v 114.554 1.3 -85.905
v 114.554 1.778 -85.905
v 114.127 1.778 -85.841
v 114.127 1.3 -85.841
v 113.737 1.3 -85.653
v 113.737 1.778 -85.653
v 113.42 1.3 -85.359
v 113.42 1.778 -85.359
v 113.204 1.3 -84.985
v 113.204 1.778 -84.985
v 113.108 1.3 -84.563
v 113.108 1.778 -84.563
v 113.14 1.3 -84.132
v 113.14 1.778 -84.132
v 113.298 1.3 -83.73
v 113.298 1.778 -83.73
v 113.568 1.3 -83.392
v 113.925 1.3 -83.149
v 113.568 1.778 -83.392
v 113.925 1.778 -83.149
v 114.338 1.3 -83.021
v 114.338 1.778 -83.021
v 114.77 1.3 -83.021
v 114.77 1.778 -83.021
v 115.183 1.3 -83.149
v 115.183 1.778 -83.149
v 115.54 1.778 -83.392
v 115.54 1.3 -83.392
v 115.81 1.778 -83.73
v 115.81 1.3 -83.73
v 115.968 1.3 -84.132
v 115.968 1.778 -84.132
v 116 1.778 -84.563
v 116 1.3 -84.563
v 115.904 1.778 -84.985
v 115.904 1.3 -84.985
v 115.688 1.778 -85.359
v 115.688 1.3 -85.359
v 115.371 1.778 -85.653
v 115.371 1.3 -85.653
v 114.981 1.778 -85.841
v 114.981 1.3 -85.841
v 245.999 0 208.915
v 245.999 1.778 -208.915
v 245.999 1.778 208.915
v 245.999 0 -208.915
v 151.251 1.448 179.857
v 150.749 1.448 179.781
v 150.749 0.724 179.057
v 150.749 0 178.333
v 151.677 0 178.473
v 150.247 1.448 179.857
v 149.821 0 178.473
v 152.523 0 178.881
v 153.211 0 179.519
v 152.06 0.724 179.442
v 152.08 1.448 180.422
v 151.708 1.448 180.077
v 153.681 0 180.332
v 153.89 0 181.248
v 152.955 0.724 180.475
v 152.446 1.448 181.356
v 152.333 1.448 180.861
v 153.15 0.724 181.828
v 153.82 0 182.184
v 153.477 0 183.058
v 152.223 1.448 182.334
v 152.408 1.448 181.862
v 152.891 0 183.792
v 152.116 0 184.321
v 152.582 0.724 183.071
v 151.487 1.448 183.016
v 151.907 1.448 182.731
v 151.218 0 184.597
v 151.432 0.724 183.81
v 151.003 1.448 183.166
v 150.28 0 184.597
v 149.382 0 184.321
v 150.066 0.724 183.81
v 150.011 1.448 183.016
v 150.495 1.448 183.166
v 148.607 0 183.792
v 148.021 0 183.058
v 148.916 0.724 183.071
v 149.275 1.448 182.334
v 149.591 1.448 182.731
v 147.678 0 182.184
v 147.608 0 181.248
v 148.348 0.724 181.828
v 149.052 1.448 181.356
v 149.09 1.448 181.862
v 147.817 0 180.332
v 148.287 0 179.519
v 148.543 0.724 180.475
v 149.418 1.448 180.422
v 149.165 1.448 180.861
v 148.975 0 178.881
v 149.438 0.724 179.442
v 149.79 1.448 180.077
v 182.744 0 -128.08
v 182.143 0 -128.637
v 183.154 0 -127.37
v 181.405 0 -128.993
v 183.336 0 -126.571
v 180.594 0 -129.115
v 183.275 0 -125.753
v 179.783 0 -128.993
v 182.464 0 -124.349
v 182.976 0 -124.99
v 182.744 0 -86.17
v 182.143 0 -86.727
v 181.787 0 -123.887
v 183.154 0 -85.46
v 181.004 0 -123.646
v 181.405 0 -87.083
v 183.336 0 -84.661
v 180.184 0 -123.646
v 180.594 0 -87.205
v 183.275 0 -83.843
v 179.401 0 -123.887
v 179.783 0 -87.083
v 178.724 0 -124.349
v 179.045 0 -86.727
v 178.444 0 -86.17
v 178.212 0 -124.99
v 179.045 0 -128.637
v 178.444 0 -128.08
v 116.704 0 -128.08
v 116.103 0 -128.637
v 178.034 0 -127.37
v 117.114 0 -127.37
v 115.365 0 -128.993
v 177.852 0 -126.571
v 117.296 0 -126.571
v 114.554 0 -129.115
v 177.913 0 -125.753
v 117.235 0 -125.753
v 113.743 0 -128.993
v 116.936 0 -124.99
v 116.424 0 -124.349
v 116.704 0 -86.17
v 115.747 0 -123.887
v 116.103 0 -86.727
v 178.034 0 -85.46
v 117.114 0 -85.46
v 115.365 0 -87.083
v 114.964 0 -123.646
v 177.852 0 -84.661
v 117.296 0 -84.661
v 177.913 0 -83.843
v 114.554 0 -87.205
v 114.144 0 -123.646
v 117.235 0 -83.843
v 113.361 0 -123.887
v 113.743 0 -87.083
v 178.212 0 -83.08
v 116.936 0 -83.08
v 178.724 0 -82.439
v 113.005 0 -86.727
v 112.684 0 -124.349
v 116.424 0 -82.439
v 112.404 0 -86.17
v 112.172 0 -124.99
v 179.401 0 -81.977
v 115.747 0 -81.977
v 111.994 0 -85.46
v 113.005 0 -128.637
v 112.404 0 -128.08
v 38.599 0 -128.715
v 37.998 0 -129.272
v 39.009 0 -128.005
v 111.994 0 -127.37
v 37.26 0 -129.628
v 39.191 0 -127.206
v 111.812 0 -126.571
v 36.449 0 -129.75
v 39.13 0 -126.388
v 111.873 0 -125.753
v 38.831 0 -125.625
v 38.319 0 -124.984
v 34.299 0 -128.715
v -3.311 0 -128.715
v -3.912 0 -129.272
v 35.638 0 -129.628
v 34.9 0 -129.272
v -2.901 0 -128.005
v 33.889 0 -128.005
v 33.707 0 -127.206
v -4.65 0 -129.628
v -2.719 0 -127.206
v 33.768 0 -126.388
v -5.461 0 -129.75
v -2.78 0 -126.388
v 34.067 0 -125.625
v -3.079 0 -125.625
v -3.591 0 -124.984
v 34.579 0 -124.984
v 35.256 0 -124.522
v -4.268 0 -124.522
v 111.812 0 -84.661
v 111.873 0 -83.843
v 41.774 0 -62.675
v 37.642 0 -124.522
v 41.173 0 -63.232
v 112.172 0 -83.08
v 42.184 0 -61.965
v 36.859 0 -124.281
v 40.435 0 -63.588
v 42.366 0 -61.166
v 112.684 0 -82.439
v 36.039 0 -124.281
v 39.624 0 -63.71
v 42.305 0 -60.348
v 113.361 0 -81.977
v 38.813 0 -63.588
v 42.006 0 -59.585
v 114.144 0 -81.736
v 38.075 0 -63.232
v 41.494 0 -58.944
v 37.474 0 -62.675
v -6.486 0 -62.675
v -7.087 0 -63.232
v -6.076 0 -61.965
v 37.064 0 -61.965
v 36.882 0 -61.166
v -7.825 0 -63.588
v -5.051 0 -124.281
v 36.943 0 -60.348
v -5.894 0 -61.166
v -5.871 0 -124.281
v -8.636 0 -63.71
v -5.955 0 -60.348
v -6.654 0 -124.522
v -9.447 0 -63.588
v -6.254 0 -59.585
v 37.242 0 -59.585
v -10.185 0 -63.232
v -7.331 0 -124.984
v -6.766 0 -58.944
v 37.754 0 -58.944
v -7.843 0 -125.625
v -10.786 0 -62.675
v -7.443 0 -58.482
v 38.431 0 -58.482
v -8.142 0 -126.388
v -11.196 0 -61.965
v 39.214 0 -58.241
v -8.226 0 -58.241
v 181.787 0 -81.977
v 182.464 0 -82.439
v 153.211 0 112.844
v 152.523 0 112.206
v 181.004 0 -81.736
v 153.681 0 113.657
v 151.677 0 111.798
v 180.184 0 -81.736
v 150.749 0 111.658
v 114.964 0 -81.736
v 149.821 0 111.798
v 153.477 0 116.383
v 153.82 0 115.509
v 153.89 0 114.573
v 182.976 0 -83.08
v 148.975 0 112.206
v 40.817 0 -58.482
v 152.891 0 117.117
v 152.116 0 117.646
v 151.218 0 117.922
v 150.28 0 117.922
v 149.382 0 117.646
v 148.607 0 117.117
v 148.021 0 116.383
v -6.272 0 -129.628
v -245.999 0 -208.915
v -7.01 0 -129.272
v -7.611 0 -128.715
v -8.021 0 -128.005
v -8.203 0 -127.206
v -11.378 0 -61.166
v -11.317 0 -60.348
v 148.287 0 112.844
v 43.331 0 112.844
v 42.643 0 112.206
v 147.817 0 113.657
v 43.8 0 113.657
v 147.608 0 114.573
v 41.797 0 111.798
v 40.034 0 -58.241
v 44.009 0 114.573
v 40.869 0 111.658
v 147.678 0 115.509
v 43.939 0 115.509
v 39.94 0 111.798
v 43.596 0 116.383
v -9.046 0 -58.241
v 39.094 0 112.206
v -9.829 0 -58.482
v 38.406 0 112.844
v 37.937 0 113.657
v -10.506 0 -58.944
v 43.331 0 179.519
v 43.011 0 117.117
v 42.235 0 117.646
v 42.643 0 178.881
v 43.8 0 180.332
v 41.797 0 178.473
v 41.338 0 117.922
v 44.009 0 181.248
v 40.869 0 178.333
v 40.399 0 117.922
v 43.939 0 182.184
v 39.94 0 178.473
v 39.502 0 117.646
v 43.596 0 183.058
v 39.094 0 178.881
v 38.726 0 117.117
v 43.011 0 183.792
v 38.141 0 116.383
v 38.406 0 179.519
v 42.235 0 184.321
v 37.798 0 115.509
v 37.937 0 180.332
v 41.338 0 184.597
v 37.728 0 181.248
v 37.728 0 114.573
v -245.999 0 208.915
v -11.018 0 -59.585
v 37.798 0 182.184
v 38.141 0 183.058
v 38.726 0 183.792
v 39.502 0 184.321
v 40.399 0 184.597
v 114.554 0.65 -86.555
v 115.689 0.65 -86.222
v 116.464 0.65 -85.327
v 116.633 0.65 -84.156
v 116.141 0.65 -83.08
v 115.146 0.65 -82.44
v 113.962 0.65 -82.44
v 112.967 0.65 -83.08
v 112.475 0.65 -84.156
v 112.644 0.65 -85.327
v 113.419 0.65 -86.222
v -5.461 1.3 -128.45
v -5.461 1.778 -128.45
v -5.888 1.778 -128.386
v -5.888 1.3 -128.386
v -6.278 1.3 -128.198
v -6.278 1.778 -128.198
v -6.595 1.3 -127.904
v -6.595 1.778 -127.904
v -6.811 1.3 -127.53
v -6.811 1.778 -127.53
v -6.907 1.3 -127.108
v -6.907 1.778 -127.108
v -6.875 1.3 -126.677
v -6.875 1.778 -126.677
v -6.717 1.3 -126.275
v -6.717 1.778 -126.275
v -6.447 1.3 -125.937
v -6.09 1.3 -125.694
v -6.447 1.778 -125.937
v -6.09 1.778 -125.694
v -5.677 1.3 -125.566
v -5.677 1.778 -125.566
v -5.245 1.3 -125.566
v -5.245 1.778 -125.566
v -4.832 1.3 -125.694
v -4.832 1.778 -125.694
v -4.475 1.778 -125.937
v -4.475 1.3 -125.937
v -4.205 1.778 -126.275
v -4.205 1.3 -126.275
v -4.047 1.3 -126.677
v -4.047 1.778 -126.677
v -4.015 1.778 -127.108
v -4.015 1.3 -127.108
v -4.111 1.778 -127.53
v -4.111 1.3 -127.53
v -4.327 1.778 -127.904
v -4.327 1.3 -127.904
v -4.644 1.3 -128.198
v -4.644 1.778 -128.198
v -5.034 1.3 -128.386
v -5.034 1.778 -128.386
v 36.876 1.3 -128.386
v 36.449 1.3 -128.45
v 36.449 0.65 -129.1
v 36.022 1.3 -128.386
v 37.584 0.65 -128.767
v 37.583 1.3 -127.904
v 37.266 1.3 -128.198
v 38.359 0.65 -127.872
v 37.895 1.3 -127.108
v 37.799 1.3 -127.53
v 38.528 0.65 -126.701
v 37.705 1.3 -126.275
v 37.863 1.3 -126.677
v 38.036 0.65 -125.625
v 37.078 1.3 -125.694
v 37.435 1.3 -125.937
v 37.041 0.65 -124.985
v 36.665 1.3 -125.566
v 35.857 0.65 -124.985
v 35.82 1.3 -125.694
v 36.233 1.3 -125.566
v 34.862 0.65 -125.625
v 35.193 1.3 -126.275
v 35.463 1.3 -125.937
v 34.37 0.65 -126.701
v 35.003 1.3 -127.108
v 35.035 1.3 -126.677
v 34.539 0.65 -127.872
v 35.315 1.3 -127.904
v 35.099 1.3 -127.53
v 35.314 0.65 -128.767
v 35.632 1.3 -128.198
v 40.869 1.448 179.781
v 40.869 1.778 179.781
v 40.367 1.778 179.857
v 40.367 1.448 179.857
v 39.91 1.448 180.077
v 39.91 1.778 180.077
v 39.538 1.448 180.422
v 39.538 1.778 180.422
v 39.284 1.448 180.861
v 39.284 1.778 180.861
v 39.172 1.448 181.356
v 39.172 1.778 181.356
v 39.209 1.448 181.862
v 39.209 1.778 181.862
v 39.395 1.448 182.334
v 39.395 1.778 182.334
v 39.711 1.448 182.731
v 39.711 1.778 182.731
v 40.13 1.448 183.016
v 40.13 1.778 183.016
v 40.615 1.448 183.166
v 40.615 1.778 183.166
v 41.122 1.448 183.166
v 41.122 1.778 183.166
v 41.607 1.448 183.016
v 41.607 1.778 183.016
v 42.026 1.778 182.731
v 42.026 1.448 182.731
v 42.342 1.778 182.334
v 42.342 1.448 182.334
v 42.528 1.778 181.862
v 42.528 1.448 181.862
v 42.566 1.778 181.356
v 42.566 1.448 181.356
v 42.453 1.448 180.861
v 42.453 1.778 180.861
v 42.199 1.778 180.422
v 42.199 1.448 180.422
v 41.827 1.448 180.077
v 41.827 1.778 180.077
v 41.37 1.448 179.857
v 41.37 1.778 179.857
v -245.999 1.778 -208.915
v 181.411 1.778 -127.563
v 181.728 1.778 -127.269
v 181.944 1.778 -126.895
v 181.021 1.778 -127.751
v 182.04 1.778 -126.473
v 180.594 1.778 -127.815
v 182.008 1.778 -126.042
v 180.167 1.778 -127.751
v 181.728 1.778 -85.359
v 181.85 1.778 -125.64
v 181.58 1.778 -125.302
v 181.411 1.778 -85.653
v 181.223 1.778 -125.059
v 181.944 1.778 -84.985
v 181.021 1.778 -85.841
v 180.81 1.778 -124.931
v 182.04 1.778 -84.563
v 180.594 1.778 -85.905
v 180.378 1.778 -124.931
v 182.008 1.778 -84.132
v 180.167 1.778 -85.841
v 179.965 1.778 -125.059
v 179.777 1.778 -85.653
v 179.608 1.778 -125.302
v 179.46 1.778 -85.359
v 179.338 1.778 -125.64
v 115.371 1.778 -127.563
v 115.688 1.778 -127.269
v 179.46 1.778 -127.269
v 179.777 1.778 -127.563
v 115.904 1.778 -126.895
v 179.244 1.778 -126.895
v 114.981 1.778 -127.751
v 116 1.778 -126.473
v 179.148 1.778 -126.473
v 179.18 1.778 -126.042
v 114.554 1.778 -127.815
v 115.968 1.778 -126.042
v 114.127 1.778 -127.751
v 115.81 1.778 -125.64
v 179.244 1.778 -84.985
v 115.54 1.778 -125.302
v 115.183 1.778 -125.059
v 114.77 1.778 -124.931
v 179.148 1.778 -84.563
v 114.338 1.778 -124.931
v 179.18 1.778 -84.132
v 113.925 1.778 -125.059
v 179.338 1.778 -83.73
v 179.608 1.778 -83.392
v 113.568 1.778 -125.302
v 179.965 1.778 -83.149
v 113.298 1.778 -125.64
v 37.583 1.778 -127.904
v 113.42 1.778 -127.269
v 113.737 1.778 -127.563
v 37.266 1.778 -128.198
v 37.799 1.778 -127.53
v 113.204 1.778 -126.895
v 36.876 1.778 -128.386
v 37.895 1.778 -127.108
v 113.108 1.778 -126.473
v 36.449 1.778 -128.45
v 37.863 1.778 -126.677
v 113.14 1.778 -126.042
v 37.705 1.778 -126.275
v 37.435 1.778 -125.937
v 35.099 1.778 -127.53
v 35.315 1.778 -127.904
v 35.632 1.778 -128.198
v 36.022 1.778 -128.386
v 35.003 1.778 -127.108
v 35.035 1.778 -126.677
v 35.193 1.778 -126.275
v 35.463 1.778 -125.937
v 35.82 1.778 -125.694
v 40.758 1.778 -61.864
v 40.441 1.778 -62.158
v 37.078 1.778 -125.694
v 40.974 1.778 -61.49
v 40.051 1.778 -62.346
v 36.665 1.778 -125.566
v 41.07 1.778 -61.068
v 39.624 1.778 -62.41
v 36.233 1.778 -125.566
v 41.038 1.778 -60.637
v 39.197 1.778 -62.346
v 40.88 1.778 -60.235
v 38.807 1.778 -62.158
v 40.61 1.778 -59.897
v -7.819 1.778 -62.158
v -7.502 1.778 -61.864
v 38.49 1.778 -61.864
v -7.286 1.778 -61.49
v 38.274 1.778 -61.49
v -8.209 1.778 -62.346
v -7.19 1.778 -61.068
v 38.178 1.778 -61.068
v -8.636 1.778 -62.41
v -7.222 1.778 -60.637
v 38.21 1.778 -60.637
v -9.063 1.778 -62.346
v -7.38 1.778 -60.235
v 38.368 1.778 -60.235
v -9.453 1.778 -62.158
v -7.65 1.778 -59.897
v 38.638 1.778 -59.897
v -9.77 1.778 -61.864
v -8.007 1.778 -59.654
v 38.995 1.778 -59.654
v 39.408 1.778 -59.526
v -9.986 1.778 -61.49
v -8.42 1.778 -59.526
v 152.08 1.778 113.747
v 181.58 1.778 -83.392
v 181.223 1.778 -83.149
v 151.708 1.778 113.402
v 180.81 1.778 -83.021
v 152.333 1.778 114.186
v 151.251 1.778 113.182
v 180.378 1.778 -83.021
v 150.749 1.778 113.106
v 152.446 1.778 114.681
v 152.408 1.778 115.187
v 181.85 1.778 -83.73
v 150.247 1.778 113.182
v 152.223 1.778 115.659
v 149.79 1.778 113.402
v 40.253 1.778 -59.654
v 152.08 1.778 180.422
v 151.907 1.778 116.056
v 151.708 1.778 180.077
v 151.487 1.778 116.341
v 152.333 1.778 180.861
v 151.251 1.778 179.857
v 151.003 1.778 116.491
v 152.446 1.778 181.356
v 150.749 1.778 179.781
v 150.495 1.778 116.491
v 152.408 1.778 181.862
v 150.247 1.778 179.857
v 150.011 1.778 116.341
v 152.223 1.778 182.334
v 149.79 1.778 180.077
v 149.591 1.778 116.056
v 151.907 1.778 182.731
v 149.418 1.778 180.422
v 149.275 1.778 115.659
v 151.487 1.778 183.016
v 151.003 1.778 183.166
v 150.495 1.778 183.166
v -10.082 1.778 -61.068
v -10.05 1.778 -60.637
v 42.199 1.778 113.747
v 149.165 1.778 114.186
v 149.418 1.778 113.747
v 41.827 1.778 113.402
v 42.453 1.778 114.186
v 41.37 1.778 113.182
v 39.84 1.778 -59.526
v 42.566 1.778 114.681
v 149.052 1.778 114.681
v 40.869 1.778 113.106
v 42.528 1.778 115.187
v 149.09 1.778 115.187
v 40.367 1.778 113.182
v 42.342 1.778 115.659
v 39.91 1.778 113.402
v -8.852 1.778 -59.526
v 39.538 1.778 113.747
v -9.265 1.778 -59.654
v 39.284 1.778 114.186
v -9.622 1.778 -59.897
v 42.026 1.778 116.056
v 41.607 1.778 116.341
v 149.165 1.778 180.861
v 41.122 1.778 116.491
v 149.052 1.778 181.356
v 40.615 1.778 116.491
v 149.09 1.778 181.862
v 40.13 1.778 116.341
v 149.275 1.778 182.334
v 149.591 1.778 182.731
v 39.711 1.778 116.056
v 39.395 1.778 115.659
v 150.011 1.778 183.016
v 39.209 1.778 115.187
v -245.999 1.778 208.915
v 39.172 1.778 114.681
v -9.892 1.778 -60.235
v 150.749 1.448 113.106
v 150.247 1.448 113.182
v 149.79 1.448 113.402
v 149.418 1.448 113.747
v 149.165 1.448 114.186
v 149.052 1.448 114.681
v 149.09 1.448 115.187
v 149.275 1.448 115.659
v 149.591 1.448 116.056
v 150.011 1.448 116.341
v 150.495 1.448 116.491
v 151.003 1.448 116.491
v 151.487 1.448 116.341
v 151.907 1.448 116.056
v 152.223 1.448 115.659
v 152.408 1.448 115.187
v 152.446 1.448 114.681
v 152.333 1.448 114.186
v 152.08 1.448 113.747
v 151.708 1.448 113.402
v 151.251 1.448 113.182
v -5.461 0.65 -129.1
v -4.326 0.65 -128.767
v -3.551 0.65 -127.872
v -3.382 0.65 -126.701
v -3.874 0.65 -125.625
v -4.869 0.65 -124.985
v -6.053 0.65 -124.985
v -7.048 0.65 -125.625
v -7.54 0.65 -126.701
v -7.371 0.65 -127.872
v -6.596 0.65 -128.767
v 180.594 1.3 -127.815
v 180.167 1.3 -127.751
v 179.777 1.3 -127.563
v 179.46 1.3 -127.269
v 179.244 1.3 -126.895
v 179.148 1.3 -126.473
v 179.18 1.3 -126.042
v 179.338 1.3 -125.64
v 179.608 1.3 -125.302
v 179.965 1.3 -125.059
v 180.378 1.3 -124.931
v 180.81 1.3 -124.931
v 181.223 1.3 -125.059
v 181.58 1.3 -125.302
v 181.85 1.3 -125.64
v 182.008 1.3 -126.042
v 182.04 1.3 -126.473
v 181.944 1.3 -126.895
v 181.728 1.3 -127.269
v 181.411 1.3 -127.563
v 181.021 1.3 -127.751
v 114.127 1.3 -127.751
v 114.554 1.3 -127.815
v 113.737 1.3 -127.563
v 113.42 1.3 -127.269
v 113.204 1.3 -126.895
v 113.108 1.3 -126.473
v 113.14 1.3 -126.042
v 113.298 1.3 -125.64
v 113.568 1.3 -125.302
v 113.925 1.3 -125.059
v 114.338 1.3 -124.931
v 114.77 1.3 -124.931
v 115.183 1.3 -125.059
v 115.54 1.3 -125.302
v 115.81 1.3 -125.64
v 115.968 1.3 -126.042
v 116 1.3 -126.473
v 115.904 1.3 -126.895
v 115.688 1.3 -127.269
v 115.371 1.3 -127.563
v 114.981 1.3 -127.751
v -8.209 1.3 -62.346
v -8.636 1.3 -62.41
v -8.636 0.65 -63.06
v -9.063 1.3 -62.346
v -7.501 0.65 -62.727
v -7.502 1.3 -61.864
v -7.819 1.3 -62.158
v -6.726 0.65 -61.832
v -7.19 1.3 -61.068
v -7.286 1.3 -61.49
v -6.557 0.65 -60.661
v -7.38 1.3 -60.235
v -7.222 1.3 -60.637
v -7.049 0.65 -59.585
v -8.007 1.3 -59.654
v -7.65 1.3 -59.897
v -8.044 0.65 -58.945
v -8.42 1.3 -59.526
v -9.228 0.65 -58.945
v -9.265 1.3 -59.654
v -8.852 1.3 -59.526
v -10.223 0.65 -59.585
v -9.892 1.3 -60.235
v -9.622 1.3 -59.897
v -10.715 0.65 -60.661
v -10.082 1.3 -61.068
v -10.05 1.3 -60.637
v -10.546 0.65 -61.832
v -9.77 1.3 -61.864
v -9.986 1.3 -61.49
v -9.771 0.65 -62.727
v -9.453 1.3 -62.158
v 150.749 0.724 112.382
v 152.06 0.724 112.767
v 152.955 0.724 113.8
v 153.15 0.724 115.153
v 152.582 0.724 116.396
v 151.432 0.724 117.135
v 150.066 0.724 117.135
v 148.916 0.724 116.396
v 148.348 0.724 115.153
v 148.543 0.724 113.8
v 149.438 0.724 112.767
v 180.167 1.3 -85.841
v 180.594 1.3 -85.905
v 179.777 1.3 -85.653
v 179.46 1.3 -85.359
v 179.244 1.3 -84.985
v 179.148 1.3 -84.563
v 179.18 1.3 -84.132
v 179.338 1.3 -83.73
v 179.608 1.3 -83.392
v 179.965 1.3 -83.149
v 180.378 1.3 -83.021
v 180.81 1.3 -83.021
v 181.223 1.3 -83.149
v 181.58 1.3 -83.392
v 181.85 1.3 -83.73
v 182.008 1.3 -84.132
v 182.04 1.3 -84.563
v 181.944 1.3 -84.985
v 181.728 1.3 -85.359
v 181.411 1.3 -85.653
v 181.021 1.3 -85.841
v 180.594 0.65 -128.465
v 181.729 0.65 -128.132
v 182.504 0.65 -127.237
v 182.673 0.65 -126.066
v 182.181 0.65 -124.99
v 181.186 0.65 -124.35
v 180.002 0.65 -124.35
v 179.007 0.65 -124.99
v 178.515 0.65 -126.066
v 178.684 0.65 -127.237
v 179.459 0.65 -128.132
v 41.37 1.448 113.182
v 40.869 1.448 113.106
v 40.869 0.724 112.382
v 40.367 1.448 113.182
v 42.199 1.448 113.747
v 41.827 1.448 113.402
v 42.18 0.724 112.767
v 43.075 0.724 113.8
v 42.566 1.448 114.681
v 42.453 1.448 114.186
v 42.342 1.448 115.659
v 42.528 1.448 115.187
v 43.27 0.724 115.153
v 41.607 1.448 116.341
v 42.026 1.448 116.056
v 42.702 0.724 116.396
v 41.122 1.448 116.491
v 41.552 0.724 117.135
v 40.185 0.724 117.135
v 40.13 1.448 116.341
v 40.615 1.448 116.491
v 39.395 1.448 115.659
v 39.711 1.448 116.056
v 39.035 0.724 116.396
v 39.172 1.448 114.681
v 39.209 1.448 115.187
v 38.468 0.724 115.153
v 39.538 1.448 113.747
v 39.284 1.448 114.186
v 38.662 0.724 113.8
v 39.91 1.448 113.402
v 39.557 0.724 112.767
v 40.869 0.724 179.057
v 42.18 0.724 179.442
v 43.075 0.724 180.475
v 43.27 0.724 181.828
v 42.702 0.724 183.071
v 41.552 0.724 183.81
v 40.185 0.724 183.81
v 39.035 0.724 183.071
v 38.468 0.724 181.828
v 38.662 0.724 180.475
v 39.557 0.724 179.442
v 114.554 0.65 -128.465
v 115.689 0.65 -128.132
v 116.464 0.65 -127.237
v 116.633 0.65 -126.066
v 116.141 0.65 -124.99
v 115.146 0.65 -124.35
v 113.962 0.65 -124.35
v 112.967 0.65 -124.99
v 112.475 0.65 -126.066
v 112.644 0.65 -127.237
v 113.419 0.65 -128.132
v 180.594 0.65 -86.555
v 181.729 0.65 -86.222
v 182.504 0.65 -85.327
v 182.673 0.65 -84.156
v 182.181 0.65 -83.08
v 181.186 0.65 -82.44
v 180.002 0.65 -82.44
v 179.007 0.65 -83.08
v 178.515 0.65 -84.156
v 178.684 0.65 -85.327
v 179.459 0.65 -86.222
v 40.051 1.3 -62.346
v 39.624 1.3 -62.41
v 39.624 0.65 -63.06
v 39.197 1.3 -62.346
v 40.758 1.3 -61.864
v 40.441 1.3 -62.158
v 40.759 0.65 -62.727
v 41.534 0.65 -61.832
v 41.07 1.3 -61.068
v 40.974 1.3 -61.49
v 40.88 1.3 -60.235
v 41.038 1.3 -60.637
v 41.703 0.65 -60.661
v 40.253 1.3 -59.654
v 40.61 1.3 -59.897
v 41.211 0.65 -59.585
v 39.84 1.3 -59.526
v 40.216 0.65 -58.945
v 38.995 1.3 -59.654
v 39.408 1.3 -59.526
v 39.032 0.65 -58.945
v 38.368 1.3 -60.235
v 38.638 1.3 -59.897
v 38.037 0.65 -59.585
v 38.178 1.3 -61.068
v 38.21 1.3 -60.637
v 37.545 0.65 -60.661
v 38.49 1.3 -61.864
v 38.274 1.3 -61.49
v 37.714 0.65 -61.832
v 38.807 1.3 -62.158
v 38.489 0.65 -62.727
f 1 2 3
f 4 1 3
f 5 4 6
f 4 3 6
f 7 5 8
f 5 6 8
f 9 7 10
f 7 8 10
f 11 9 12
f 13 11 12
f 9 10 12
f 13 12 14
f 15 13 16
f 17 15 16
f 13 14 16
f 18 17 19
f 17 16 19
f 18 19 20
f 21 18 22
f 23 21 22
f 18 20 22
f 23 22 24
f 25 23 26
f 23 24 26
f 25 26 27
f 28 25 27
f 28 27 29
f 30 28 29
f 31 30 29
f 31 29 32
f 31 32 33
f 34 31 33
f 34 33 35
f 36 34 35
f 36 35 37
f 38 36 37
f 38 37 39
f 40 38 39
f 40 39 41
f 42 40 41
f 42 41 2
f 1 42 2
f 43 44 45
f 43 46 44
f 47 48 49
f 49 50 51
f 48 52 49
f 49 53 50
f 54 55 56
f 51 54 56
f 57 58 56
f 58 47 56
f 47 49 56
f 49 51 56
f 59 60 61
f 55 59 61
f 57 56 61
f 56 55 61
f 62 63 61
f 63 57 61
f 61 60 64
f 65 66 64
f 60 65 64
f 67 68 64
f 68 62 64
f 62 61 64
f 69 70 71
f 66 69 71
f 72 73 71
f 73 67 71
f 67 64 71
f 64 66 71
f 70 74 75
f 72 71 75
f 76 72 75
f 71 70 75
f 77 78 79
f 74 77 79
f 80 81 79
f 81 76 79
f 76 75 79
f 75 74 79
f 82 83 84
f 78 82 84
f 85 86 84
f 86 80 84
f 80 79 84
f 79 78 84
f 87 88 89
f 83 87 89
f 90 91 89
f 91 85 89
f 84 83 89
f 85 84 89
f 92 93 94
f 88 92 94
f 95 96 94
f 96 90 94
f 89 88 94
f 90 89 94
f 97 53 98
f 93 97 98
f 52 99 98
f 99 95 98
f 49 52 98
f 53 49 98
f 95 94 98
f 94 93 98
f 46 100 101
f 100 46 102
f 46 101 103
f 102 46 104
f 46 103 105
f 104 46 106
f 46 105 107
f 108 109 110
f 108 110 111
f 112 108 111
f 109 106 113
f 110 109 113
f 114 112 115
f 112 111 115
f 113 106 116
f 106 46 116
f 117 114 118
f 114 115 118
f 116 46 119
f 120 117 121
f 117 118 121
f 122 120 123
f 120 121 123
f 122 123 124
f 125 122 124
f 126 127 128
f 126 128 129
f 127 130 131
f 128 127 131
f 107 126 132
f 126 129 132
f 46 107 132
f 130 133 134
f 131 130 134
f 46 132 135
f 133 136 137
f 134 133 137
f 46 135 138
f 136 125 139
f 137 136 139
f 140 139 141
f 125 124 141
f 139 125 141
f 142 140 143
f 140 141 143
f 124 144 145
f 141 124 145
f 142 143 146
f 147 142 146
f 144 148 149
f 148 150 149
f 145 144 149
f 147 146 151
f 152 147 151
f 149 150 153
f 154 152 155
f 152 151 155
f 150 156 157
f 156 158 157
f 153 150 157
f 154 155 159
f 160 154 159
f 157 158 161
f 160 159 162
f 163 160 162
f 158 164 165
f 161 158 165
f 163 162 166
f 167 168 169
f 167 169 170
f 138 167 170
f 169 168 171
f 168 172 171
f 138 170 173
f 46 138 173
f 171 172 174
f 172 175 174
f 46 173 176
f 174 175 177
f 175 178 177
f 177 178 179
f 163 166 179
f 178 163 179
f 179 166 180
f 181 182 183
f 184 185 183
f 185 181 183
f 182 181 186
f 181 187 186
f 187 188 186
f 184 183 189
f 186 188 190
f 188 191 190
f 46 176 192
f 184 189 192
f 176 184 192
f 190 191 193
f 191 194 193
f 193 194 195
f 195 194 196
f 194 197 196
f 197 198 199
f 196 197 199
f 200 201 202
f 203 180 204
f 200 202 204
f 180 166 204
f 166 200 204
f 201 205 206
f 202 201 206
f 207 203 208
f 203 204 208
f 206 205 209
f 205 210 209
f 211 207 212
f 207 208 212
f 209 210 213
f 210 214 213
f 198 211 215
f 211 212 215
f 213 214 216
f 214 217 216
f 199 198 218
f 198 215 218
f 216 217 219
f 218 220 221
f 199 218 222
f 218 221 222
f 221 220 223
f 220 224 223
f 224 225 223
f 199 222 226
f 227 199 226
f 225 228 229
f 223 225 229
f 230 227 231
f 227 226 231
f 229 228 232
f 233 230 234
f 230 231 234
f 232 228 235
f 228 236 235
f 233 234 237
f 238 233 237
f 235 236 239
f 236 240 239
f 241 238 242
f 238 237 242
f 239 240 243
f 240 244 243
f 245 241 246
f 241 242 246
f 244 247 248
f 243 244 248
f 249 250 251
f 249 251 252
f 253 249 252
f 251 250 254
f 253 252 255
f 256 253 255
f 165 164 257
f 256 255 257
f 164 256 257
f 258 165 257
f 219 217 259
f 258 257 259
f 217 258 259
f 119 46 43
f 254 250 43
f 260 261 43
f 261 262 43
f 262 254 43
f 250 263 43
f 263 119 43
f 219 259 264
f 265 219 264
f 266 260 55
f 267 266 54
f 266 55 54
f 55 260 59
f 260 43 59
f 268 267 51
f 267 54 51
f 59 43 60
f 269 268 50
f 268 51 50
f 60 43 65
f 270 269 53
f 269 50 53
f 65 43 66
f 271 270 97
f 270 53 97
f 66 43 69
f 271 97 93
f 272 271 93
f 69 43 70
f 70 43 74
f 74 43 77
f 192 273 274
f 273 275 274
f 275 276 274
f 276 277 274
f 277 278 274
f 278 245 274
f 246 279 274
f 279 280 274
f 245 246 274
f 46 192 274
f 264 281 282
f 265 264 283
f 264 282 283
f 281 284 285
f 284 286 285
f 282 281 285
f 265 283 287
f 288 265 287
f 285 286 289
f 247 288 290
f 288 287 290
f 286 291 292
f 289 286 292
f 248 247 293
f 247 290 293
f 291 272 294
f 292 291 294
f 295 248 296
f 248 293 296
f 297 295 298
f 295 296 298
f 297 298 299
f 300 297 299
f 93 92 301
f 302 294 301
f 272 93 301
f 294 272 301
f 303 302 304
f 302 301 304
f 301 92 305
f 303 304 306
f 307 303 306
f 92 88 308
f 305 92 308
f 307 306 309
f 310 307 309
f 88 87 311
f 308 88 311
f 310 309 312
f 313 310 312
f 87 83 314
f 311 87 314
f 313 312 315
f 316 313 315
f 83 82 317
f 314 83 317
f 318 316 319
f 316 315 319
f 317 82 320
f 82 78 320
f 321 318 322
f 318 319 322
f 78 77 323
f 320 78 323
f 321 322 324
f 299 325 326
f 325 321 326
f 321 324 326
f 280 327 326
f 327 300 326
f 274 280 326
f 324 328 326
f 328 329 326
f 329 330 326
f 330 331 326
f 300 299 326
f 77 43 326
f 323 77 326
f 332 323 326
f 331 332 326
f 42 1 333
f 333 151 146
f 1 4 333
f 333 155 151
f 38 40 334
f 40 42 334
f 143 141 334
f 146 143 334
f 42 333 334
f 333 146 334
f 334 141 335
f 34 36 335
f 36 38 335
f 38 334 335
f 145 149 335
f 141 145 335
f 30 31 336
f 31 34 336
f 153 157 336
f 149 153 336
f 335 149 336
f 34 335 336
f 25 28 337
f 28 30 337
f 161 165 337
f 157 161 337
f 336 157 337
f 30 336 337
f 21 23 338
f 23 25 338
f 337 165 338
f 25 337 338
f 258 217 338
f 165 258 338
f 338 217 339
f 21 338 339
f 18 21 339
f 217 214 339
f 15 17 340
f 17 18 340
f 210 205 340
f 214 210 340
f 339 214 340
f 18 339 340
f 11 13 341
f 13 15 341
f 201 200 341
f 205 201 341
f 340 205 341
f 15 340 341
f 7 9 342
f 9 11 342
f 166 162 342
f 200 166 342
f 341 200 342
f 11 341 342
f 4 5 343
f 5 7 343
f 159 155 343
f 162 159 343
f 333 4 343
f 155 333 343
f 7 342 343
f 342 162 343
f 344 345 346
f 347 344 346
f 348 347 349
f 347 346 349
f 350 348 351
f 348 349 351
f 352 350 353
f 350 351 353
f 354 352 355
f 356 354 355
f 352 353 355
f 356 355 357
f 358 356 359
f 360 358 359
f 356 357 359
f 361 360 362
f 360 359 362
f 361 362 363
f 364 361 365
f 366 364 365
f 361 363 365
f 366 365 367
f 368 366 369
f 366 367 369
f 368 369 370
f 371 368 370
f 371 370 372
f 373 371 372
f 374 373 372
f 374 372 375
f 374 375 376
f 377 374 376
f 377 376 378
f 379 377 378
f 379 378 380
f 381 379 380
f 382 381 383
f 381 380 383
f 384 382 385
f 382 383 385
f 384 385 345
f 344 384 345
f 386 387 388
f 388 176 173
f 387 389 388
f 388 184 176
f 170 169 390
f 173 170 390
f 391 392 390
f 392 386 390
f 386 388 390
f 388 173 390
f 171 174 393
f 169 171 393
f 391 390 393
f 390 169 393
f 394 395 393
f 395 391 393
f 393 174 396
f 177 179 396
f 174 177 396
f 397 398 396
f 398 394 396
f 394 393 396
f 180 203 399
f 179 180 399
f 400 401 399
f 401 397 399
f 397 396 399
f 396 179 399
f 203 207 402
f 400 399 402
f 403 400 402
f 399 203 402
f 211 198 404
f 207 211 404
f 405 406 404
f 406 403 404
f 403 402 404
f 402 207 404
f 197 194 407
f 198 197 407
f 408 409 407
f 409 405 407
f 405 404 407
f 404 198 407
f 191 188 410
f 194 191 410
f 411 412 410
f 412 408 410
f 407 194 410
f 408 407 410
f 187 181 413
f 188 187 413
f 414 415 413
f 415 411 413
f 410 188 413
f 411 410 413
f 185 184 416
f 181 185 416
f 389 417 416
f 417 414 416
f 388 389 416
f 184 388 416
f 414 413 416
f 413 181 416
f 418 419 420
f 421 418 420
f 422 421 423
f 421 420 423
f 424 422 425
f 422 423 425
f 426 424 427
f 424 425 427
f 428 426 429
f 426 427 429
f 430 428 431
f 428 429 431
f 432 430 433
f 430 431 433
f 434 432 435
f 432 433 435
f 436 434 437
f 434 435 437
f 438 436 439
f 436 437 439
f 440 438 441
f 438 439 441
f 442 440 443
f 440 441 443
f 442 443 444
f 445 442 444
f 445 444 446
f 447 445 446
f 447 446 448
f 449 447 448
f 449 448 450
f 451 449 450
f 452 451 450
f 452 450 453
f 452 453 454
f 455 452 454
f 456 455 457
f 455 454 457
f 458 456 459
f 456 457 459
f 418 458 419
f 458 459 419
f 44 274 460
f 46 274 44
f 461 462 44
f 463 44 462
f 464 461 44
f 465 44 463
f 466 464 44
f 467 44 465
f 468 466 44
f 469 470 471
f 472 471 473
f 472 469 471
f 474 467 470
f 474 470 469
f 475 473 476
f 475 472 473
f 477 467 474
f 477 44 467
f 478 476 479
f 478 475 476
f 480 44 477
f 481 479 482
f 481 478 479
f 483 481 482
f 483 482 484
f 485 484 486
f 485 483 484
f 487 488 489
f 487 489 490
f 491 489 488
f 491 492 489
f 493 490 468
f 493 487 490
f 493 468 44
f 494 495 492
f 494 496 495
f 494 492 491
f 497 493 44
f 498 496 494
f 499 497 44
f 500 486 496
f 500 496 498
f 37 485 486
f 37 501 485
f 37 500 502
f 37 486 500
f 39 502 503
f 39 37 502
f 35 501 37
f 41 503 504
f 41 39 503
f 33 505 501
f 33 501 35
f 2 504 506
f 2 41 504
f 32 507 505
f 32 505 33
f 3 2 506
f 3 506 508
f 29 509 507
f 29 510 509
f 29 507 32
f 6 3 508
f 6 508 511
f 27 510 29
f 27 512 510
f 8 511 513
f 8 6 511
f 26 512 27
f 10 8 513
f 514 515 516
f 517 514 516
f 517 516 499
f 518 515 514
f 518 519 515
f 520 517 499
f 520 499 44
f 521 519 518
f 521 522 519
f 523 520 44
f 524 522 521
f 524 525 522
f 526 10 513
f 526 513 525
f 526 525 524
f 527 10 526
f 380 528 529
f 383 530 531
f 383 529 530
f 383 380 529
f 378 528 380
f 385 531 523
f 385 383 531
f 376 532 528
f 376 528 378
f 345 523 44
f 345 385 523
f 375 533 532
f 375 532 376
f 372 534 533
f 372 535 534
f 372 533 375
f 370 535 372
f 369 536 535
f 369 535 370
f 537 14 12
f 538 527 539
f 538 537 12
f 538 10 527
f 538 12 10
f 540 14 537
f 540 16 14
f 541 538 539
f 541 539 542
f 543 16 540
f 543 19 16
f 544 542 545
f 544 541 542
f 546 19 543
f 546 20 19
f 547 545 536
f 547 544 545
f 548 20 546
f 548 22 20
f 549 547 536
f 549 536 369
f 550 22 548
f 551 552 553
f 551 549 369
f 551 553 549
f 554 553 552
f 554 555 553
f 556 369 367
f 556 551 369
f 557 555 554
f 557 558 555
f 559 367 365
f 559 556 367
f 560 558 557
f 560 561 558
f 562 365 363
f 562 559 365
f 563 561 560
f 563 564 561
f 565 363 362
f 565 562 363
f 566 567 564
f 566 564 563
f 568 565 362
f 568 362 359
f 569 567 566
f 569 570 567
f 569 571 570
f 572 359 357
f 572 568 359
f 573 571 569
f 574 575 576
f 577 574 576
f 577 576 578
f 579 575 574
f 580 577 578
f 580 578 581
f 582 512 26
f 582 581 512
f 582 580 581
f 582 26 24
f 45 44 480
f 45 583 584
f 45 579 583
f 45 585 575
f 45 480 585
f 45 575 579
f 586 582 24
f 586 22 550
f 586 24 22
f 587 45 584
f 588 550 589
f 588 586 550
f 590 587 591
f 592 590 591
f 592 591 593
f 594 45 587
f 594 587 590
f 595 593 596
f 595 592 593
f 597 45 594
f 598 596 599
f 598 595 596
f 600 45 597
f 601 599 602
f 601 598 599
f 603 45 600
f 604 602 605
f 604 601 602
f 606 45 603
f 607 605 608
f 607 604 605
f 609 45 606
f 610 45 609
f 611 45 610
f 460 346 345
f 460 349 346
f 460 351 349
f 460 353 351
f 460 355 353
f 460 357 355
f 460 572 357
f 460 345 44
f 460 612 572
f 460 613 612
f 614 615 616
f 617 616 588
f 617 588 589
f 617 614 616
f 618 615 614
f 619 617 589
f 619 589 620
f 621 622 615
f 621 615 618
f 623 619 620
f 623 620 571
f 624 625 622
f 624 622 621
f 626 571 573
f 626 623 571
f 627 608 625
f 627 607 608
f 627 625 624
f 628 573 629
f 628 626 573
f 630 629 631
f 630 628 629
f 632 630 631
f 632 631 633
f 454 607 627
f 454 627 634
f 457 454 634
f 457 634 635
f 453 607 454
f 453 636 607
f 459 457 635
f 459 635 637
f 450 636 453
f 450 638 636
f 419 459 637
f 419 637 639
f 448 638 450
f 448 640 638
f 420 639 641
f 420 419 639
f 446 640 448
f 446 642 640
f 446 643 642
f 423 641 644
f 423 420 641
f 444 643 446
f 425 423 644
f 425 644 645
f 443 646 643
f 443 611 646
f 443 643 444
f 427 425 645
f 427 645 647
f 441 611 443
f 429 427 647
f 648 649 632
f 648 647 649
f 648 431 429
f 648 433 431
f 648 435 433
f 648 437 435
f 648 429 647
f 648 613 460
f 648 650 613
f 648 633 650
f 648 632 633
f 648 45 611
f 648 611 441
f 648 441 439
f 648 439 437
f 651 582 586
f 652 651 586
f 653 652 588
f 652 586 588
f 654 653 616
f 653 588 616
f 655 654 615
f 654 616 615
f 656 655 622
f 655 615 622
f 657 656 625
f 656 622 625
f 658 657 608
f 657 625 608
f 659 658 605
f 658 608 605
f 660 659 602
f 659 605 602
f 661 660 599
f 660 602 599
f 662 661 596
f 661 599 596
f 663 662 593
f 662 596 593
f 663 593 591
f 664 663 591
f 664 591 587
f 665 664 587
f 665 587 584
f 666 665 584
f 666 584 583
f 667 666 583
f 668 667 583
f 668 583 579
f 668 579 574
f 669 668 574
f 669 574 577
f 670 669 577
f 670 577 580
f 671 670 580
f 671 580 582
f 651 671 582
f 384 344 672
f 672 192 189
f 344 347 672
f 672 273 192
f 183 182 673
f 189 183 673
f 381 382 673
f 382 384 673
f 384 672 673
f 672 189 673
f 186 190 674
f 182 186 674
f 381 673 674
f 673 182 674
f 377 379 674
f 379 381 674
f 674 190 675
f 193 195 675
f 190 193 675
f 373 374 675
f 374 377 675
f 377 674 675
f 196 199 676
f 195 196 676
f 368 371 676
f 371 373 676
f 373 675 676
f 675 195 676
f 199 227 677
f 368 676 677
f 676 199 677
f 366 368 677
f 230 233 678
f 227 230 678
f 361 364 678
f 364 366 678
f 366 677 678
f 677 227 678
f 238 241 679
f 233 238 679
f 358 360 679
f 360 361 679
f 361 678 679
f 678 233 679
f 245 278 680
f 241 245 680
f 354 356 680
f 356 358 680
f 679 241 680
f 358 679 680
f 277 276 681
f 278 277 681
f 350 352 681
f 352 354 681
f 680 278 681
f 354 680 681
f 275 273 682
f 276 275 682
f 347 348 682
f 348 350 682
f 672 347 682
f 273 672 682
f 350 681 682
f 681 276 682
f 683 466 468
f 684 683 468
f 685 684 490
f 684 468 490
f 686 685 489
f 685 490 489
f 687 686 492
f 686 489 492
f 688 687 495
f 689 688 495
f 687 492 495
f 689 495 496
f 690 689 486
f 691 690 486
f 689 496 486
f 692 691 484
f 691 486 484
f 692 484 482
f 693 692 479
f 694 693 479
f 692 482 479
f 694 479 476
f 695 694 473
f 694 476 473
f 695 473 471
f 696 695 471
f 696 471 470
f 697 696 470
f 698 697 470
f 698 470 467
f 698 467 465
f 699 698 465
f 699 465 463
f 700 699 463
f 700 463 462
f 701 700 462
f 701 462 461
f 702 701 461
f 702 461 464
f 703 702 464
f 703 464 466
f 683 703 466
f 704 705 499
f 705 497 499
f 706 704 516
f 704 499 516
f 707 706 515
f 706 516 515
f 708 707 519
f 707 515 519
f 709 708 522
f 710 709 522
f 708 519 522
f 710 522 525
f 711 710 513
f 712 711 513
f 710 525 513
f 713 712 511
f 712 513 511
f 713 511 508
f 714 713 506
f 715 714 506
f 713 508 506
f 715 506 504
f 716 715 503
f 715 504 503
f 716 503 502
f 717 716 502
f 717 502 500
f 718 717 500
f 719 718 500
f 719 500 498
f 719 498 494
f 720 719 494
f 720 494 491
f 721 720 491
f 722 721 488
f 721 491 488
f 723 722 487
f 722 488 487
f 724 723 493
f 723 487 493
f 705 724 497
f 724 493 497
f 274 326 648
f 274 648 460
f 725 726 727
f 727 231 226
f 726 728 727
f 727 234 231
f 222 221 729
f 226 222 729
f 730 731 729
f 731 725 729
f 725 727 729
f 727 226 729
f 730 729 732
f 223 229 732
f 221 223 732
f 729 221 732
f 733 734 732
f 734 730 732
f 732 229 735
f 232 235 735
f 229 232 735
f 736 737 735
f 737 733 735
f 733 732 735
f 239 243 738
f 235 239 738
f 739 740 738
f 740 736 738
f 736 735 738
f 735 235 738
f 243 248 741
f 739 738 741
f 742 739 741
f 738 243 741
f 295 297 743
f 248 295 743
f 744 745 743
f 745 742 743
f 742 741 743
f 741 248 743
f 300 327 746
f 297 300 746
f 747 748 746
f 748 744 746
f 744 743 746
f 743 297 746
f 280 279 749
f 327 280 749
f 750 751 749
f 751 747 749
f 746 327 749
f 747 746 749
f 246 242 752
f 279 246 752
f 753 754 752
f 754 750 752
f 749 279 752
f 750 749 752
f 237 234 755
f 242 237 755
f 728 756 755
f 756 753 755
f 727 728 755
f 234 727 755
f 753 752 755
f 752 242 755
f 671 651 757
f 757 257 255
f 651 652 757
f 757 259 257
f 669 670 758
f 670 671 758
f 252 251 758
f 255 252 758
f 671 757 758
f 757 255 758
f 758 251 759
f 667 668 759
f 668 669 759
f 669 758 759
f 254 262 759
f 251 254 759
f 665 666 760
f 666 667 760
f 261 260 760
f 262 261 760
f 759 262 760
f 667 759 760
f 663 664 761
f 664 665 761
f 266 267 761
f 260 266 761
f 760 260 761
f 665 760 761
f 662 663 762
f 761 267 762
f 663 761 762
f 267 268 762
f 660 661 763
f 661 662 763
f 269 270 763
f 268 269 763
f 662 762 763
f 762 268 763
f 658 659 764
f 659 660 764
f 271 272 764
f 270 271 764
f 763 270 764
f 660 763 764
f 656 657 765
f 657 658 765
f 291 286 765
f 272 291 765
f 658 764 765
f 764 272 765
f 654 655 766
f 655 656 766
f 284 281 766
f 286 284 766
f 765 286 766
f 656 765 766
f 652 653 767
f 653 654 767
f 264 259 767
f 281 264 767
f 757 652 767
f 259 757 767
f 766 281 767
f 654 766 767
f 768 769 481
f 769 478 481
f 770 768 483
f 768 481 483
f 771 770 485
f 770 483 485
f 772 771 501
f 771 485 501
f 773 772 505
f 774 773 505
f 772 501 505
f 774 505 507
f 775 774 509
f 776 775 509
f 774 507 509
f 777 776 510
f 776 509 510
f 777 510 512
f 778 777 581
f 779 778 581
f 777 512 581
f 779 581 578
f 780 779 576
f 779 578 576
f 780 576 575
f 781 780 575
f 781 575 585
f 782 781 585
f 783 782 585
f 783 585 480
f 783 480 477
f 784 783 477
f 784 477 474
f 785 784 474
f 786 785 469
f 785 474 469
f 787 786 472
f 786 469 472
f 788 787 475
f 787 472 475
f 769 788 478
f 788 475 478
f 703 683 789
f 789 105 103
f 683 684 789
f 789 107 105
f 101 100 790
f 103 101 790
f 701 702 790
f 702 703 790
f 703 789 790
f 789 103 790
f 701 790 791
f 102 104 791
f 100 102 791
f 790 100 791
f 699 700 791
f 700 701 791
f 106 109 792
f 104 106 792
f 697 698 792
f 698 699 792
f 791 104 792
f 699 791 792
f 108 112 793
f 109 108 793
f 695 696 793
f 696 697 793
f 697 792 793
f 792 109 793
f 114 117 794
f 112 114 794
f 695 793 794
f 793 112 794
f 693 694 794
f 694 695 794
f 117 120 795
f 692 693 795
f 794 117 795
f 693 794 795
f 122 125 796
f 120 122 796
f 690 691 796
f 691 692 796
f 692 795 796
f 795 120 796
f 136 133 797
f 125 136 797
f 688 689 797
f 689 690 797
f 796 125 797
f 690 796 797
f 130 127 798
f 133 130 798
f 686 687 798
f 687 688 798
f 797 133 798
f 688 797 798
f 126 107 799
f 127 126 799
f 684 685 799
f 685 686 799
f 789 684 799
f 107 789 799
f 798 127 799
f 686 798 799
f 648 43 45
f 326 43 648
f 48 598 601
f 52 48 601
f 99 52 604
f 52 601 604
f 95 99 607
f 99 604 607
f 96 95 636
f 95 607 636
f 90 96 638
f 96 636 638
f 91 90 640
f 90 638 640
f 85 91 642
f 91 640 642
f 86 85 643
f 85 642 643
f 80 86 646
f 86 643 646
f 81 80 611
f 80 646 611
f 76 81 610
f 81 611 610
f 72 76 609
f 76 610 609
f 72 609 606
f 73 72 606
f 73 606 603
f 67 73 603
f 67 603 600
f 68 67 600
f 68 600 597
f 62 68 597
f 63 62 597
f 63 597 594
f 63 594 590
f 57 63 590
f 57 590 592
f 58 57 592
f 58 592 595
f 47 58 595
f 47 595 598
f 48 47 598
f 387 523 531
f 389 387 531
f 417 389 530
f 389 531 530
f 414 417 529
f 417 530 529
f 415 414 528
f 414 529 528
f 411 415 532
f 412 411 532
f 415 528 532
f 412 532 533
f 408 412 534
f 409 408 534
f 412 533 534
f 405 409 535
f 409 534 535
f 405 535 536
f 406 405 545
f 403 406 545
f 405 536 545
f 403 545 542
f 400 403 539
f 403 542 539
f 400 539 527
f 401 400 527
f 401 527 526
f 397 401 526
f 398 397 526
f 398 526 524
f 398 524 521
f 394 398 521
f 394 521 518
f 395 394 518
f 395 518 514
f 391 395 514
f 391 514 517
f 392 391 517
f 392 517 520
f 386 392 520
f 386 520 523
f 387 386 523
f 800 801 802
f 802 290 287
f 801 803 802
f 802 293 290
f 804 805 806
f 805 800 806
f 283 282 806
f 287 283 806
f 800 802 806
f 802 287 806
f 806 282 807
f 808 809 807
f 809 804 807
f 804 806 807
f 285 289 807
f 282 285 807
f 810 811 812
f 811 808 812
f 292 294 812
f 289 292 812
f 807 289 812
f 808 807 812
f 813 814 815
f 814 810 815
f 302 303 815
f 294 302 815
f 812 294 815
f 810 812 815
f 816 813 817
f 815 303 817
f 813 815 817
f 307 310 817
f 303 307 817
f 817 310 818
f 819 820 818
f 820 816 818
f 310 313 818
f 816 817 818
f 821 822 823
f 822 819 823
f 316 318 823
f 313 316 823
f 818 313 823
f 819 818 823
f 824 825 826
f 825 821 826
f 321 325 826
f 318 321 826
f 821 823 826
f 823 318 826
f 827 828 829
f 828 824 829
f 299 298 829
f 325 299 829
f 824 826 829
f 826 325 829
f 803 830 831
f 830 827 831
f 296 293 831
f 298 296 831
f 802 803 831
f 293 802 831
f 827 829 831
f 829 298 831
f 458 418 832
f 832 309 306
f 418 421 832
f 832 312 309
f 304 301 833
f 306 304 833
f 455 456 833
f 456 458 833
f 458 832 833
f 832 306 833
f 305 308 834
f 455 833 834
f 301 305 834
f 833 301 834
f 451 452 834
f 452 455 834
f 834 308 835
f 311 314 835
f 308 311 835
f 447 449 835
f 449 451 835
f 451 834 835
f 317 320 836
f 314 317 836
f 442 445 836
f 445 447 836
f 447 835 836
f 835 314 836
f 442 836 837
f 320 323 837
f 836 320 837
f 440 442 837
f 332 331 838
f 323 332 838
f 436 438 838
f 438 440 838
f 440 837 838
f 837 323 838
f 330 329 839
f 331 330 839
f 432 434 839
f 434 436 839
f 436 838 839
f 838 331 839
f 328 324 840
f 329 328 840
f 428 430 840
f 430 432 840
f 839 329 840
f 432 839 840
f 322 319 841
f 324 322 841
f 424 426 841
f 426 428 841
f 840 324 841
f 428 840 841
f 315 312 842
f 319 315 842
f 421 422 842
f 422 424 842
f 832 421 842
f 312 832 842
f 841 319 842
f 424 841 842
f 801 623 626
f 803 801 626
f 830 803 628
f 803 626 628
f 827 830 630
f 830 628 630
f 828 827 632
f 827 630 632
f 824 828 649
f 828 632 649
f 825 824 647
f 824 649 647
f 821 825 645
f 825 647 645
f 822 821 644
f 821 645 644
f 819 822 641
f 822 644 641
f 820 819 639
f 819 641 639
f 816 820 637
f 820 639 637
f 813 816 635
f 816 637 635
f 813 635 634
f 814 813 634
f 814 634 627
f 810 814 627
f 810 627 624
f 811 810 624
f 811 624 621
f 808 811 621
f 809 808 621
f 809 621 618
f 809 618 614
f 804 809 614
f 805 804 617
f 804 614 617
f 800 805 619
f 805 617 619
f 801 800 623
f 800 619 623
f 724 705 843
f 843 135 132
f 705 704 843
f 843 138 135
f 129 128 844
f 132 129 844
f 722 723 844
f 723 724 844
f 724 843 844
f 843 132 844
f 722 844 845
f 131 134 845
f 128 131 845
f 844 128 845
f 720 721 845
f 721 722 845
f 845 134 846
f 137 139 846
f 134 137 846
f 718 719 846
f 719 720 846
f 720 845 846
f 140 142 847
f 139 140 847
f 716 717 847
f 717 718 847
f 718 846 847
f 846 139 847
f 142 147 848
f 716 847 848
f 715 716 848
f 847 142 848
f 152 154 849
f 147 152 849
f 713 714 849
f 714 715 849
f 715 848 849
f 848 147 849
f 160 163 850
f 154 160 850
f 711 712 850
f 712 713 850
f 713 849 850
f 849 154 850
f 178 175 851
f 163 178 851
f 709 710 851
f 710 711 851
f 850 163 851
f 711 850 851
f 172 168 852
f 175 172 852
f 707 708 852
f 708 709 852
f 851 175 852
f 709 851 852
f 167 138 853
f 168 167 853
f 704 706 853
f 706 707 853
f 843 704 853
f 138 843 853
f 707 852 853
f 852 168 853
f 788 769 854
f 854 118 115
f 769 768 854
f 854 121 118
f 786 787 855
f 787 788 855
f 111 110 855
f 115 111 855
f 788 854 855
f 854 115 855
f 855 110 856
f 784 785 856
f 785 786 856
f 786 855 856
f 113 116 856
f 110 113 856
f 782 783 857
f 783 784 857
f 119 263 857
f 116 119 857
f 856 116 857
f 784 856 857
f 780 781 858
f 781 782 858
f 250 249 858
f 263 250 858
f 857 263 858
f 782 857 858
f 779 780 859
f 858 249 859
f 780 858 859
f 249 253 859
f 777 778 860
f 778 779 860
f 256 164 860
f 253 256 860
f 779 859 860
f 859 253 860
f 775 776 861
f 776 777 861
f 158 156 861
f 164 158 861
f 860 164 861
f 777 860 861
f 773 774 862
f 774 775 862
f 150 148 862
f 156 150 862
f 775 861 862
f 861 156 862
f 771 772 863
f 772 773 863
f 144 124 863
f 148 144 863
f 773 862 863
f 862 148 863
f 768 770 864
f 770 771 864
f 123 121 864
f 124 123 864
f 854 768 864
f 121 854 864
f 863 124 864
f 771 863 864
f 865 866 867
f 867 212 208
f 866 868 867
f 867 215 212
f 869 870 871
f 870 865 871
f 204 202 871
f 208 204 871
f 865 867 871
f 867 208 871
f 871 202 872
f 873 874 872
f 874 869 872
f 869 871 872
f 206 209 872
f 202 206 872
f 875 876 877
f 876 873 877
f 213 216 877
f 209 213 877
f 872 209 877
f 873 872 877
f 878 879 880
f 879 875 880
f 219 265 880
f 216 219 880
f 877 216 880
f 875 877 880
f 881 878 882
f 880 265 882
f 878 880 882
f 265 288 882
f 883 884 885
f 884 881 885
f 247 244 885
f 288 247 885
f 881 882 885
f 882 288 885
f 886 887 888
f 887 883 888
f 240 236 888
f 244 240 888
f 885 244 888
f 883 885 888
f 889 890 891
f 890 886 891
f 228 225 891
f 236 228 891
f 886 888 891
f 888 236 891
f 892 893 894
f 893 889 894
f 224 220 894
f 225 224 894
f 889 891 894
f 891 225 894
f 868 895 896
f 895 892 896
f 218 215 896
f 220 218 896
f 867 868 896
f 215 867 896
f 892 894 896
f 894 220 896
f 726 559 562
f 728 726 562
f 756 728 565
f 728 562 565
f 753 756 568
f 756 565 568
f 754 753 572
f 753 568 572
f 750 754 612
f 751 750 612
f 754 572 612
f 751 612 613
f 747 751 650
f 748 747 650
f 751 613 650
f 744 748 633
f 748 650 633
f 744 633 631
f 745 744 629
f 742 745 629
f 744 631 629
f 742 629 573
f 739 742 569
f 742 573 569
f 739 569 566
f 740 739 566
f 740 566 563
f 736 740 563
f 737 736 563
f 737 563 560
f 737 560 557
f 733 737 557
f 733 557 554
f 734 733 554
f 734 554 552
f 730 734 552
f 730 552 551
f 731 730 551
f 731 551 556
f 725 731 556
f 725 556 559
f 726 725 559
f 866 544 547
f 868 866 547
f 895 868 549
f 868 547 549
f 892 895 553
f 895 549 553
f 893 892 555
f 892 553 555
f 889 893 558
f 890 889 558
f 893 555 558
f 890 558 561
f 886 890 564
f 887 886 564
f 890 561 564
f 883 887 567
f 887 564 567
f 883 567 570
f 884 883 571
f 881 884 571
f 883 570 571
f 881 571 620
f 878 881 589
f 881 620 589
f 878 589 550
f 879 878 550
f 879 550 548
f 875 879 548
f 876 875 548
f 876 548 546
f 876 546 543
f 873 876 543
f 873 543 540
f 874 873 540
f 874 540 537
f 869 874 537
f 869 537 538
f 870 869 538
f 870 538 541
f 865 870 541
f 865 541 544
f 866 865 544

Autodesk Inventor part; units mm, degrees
ref_plane "YZ Plane" through (0, 0, 0) normal (1, 0, 0) x (0, 1, 0)
ref_plane "XZ Plane" through (0, 0, 0) normal (0, 1, 0) x (-1, 0, 0)
ref_plane "XY Plane" through (0, 0, 0) normal (0, 0, 1) x (1, 0, 0)
sketch "Sketch1" plane through (0, 0, 0) normal (0, 1, 0) x (-1, 0, 0)
  line L0 (-245.999, 208.915) -> (245.999, 208.915)
  line L1 (245.999, 208.915) -> (245.999, -208.915)
  line L2 (245.999, -208.915) -> (-245.999, -208.915)
  line L3 (-245.999, -208.915) -> (-245.999, 208.915)
  line L4 (-245.999, 208.915) -> (245.999, -208.915) construction
  line L5 (245.999, 208.915) -> (-245.999, -208.915) construction
  point P0 (0, 0)
  dimension "d0" = 417.83
  dimension "d1" = 491.998
extrude "Extrusion1" add sketch "Sketch1" along normal blind 1.778
sketch "wr" plane through (0, 1.778, 0) normal (0, 1, 0) x (1, 0, 0)
  line L0 (236.474, -199.39) -> (-236.474, -199.39) construction
  line L1 (-236.474, -199.39) -> (-236.474, 199.39) construction
  line L2 (-236.474, 199.39) -> (236.474, 199.39) construction
  line L3 (236.474, 199.39) -> (236.474, -199.39) construction
  line L4 (236.474, -199.39) -> (-236.474, 199.39) construction
  line L5 (-236.474, -199.39) -> (236.474, 199.39) construction
  line L6 (-245.999, -208.915) -> (245.999, -208.915) construction
  line L7 (245.999, -208.915) -> (245.999, 208.915) construction
  line L8 (163.449, -197.358) -> (28.1686, -197.358) construction
  line L9 (28.1686, -197.358) -> (28.1686, -92.2274) construction
  line L10 (28.1686, -92.2274) -> (163.449, -92.2274) construction
  line L11 (163.449, -92.2274) -> (163.449, -197.358) construction
  line L12 (163.449, -197.358) -> (28.1686, -92.2274) construction
  line L13 (28.1686, -197.358) -> (163.449, -92.2274) construction
  point P0 (0, 0)
  point P1 (95.8088, -144.7927)
  point P2 (95.8088, -144.7927)
  point P3 (150.749, -181.483)
  point P4 (40.8686, -181.483)
  point P5 (40.8686, -114.808)
  point P6 (150.749, -114.808)
  dimension "d4" = 9.525
  dimension "d5" = 9.525
  dimension "d6" = 105.1306
  dimension "d7" = 135.2804
  dimension "d9" = 11.557
  dimension "d10" = 82.55
  dimension "d23" = 15.875
  dimension "d24" = 15.875
  dimension "d25" = 12.7
  dimension "d26" = 12.7
  dimension "d27" = 82.55
  dimension "d28" = 82.55
  dimension "d29" = 12.7
  dimension "d30" = 12.7
sketch "bbb" plane through (0, 1.778, 0) normal (0, 1, 0) x (1, 0, 0)
  line L0 (-11.811, 46.355) -> (-11.811, 132.715) construction
  line L1 (-11.811, 132.715) -> (42.799, 132.715) construction
  line L2 (42.799, 132.715) -> (42.799, 46.355) construction
  line L3 (42.799, 46.355) -> (-11.811, 46.355) construction
  line L4 (-11.811, 46.355) -> (42.799, 132.715) construction
  line L5 (-11.811, 132.715) -> (42.799, 46.355) construction
  line L6 (245.999, 208.915) -> (-245.999, 208.915) construction
  line L7 (245.999, -208.915) -> (245.999, 208.915) construction
  line L8 (-42.799, -208.915) -> (-42.799, 208.915) construction
  point P0 (0, 0)
  point P1 (15.494, 89.535)
  point P2 (39.624, 60.96)
  point P3 (-8.636, 60.96)
  point P4 (36.449, 127)
  point P5 (-5.461, 127)
  dimension "d11" = 54.61
  dimension "d12" = 86.36
  dimension "d13" = 14.605
  dimension "d14" = 14.605
  dimension "d15" = 3.175
  dimension "d16" = 3.175
  dimension "d17" = 80.645
  dimension "d18" = 6.35
  dimension "d19" = 80.645
  dimension "d20" = 48.26
  dimension "d82" = 203.2
  dimension "d83" = 76.2
  dimension "d84" = 288.798
sketch "Sketch5" plane through (0, 0, 0) normal (0, -1, 0) x (1, 0, 0)
  point P0 (0, 0)
  point P1 (36.449, -127)
  point P2 (-5.461, -127)
  point P3 (-8.636, -60.96)
  point P4 (39.624, -60.96)
sketch "bbb bob" plane through (0, 1.778, 0) normal (0, 1, 0) x (1, 0, 0)
  line L0 (245.999, -208.915) -> (-245.999, -208.915) projected
  line L1 (-42.799, -208.915) -> (-42.799, 208.1802) construction
  line L2 (245.999, -208.915) -> (245.999, 208.915) construction
  line L3 (195.199, 78.105) -> (108.839, 78.105) construction
  line L4 (108.839, 78.105) -> (108.839, 132.715) construction
  line L5 (108.839, 132.715) -> (195.199, 132.715) construction
  line L6 (195.199, 132.715) -> (195.199, 78.105) construction
  line L7 (195.199, 78.105) -> (108.839, 132.715) construction
  line L8 (108.839, 78.105) -> (195.199, 132.715) construction
  line L9 (245.999, 208.915) -> (-245.999, 208.915) construction
  point P0 (0, 0)
  point P1 (152.019, 105.41)
  point P2 (180.594, 84.455)
  point P3 (180.594, 126.365)
  point P4 (114.554, 84.455)
  point P5 (114.554, 126.365)
  dimension "d45" = 288.798
  dimension "d60" = 54.61
  dimension "d61" = 86.36
  dimension "d62" = 76.2
  dimension "d63" = 50.8
  dimension "d65" = 14.605
  dimension "d66" = 6.35
  dimension "d69" = 41.91
  dimension "d72" = 66.04
sketch "Sketch7" plane through (0, 0, 0) normal (0, -1, 0) x (1, 0, 0)
  point P0 (0, 0)
  point P1 (40.8686, 181.483)
  point P2 (40.8686, 114.808)
  point P3 (150.749, 181.483)
  point P4 (150.749, 114.808)
hole "wrlen holes" at (40.8686, 0, 114.808) at (40.8686, 0, 181.483) at (150.749, 0, 181.483) at (150.749, 0, 114.808) direction (0, 1, 0) diameter 3.4036 end through all countersink diameter 6.2992 countersink angle 90 clearance for "Countersunk Flat Head Screw ISO 2009/7046" size "M3" standard "ISO"
sketch "Sketch8" plane through (0, 0, 0) normal (0, -1, 0) x (1, 0, 0)
  point P0 (0, 0)
  point P1 (114.554, -126.365)
  point P2 (114.554, -84.455)
  point P3 (180.594, -126.365)
  point P4 (180.594, -84.455)
hole "bbb holes" at (-5.461, 0, -127) at (-8.636, 0, -60.96) at (39.624, 0, -60.96) at (36.449, 0, -127) direction (0, 1, 0) diameter 2.9 end through all countersink diameter 5.5 countersink angle 90 clearance for "Countersunk Flat Head Screw ISO 2009/7046" size "M2.5" standard "ISO"
hole "bbb bob holes" at (114.554, 0, -126.365) at (114.554, 0, -84.455) at (180.594, 0, -84.455) at (180.594, 0, -126.365) direction (0, 1, 0) diameter 2.9 end through all countersink diameter 5.5 countersink angle 90 clearance for "Countersunk Flat Head Screw ISO 2009/7046" size "M2.5" standard "ISO"
properties part number "nmt_bottom"
